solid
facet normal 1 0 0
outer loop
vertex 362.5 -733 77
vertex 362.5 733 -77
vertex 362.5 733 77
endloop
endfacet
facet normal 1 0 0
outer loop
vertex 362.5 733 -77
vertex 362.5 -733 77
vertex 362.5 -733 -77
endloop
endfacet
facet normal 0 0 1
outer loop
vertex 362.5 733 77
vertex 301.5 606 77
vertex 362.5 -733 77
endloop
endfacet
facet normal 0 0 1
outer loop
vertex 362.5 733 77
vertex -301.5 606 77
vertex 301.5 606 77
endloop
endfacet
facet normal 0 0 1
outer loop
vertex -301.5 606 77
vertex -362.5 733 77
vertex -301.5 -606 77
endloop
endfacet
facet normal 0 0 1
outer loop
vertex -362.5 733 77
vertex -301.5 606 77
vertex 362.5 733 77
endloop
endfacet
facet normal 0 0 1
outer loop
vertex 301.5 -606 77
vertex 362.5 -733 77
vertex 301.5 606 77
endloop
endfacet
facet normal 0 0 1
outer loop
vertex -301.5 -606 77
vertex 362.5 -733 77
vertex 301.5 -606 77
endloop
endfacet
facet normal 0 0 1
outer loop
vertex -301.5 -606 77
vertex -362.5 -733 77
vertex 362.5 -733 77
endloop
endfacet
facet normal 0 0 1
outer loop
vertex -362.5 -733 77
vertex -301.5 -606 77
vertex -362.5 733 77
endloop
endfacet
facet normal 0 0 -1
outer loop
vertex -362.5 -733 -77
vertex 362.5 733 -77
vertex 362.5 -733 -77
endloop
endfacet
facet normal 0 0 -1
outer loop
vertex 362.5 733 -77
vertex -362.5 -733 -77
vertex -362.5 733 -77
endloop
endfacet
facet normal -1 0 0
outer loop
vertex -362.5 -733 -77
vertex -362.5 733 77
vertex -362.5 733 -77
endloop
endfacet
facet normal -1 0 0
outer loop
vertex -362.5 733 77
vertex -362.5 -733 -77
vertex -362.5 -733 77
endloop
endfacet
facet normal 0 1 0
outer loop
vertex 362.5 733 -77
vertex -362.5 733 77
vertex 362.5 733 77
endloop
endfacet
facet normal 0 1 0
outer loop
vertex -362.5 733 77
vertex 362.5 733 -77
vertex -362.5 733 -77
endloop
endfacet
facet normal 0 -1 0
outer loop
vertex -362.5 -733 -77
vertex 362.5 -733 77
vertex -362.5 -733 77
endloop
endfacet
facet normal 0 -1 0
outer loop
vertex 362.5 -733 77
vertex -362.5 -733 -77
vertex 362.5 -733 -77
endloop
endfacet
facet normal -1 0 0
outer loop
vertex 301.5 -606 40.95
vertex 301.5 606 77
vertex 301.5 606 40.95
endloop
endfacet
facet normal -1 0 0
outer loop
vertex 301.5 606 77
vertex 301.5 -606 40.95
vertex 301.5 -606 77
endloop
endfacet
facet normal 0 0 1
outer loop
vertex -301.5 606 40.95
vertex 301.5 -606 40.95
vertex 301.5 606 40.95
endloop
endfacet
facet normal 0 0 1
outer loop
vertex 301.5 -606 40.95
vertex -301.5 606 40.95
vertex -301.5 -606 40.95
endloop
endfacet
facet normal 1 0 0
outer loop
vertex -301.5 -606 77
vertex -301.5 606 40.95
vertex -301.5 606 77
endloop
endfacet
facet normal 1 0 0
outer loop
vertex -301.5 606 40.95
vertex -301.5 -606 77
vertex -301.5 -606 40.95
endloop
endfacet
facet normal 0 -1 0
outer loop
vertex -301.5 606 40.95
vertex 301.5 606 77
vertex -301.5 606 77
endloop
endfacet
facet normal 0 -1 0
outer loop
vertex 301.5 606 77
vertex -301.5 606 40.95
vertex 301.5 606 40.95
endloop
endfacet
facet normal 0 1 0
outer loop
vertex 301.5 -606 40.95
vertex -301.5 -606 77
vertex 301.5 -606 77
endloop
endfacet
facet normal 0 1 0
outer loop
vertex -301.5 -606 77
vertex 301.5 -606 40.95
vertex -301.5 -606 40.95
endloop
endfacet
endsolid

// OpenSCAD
// Box dimensions
box_width = 725;
box_depth = 1466;
box_height = 154;

// Recess parameters
recess_depth = 36;
bezel_width_x = 61;
bezel_width_y = 127;

// Calculated recess dimensions
recess_width = box_width - (2 * bezel_width_x);
recess_depth_y = box_depth - (2 * bezel_width_y);

difference() {
    // Main box
    cube([box_width, box_depth, box_height], center=true);
    
    // Recess cutout on top
    translate([0, 0, (box_height - recess_depth) / 2]) {
        cube([recess_width, recess_depth_y, recess_depth + 0.1], center=true);
    }
}
